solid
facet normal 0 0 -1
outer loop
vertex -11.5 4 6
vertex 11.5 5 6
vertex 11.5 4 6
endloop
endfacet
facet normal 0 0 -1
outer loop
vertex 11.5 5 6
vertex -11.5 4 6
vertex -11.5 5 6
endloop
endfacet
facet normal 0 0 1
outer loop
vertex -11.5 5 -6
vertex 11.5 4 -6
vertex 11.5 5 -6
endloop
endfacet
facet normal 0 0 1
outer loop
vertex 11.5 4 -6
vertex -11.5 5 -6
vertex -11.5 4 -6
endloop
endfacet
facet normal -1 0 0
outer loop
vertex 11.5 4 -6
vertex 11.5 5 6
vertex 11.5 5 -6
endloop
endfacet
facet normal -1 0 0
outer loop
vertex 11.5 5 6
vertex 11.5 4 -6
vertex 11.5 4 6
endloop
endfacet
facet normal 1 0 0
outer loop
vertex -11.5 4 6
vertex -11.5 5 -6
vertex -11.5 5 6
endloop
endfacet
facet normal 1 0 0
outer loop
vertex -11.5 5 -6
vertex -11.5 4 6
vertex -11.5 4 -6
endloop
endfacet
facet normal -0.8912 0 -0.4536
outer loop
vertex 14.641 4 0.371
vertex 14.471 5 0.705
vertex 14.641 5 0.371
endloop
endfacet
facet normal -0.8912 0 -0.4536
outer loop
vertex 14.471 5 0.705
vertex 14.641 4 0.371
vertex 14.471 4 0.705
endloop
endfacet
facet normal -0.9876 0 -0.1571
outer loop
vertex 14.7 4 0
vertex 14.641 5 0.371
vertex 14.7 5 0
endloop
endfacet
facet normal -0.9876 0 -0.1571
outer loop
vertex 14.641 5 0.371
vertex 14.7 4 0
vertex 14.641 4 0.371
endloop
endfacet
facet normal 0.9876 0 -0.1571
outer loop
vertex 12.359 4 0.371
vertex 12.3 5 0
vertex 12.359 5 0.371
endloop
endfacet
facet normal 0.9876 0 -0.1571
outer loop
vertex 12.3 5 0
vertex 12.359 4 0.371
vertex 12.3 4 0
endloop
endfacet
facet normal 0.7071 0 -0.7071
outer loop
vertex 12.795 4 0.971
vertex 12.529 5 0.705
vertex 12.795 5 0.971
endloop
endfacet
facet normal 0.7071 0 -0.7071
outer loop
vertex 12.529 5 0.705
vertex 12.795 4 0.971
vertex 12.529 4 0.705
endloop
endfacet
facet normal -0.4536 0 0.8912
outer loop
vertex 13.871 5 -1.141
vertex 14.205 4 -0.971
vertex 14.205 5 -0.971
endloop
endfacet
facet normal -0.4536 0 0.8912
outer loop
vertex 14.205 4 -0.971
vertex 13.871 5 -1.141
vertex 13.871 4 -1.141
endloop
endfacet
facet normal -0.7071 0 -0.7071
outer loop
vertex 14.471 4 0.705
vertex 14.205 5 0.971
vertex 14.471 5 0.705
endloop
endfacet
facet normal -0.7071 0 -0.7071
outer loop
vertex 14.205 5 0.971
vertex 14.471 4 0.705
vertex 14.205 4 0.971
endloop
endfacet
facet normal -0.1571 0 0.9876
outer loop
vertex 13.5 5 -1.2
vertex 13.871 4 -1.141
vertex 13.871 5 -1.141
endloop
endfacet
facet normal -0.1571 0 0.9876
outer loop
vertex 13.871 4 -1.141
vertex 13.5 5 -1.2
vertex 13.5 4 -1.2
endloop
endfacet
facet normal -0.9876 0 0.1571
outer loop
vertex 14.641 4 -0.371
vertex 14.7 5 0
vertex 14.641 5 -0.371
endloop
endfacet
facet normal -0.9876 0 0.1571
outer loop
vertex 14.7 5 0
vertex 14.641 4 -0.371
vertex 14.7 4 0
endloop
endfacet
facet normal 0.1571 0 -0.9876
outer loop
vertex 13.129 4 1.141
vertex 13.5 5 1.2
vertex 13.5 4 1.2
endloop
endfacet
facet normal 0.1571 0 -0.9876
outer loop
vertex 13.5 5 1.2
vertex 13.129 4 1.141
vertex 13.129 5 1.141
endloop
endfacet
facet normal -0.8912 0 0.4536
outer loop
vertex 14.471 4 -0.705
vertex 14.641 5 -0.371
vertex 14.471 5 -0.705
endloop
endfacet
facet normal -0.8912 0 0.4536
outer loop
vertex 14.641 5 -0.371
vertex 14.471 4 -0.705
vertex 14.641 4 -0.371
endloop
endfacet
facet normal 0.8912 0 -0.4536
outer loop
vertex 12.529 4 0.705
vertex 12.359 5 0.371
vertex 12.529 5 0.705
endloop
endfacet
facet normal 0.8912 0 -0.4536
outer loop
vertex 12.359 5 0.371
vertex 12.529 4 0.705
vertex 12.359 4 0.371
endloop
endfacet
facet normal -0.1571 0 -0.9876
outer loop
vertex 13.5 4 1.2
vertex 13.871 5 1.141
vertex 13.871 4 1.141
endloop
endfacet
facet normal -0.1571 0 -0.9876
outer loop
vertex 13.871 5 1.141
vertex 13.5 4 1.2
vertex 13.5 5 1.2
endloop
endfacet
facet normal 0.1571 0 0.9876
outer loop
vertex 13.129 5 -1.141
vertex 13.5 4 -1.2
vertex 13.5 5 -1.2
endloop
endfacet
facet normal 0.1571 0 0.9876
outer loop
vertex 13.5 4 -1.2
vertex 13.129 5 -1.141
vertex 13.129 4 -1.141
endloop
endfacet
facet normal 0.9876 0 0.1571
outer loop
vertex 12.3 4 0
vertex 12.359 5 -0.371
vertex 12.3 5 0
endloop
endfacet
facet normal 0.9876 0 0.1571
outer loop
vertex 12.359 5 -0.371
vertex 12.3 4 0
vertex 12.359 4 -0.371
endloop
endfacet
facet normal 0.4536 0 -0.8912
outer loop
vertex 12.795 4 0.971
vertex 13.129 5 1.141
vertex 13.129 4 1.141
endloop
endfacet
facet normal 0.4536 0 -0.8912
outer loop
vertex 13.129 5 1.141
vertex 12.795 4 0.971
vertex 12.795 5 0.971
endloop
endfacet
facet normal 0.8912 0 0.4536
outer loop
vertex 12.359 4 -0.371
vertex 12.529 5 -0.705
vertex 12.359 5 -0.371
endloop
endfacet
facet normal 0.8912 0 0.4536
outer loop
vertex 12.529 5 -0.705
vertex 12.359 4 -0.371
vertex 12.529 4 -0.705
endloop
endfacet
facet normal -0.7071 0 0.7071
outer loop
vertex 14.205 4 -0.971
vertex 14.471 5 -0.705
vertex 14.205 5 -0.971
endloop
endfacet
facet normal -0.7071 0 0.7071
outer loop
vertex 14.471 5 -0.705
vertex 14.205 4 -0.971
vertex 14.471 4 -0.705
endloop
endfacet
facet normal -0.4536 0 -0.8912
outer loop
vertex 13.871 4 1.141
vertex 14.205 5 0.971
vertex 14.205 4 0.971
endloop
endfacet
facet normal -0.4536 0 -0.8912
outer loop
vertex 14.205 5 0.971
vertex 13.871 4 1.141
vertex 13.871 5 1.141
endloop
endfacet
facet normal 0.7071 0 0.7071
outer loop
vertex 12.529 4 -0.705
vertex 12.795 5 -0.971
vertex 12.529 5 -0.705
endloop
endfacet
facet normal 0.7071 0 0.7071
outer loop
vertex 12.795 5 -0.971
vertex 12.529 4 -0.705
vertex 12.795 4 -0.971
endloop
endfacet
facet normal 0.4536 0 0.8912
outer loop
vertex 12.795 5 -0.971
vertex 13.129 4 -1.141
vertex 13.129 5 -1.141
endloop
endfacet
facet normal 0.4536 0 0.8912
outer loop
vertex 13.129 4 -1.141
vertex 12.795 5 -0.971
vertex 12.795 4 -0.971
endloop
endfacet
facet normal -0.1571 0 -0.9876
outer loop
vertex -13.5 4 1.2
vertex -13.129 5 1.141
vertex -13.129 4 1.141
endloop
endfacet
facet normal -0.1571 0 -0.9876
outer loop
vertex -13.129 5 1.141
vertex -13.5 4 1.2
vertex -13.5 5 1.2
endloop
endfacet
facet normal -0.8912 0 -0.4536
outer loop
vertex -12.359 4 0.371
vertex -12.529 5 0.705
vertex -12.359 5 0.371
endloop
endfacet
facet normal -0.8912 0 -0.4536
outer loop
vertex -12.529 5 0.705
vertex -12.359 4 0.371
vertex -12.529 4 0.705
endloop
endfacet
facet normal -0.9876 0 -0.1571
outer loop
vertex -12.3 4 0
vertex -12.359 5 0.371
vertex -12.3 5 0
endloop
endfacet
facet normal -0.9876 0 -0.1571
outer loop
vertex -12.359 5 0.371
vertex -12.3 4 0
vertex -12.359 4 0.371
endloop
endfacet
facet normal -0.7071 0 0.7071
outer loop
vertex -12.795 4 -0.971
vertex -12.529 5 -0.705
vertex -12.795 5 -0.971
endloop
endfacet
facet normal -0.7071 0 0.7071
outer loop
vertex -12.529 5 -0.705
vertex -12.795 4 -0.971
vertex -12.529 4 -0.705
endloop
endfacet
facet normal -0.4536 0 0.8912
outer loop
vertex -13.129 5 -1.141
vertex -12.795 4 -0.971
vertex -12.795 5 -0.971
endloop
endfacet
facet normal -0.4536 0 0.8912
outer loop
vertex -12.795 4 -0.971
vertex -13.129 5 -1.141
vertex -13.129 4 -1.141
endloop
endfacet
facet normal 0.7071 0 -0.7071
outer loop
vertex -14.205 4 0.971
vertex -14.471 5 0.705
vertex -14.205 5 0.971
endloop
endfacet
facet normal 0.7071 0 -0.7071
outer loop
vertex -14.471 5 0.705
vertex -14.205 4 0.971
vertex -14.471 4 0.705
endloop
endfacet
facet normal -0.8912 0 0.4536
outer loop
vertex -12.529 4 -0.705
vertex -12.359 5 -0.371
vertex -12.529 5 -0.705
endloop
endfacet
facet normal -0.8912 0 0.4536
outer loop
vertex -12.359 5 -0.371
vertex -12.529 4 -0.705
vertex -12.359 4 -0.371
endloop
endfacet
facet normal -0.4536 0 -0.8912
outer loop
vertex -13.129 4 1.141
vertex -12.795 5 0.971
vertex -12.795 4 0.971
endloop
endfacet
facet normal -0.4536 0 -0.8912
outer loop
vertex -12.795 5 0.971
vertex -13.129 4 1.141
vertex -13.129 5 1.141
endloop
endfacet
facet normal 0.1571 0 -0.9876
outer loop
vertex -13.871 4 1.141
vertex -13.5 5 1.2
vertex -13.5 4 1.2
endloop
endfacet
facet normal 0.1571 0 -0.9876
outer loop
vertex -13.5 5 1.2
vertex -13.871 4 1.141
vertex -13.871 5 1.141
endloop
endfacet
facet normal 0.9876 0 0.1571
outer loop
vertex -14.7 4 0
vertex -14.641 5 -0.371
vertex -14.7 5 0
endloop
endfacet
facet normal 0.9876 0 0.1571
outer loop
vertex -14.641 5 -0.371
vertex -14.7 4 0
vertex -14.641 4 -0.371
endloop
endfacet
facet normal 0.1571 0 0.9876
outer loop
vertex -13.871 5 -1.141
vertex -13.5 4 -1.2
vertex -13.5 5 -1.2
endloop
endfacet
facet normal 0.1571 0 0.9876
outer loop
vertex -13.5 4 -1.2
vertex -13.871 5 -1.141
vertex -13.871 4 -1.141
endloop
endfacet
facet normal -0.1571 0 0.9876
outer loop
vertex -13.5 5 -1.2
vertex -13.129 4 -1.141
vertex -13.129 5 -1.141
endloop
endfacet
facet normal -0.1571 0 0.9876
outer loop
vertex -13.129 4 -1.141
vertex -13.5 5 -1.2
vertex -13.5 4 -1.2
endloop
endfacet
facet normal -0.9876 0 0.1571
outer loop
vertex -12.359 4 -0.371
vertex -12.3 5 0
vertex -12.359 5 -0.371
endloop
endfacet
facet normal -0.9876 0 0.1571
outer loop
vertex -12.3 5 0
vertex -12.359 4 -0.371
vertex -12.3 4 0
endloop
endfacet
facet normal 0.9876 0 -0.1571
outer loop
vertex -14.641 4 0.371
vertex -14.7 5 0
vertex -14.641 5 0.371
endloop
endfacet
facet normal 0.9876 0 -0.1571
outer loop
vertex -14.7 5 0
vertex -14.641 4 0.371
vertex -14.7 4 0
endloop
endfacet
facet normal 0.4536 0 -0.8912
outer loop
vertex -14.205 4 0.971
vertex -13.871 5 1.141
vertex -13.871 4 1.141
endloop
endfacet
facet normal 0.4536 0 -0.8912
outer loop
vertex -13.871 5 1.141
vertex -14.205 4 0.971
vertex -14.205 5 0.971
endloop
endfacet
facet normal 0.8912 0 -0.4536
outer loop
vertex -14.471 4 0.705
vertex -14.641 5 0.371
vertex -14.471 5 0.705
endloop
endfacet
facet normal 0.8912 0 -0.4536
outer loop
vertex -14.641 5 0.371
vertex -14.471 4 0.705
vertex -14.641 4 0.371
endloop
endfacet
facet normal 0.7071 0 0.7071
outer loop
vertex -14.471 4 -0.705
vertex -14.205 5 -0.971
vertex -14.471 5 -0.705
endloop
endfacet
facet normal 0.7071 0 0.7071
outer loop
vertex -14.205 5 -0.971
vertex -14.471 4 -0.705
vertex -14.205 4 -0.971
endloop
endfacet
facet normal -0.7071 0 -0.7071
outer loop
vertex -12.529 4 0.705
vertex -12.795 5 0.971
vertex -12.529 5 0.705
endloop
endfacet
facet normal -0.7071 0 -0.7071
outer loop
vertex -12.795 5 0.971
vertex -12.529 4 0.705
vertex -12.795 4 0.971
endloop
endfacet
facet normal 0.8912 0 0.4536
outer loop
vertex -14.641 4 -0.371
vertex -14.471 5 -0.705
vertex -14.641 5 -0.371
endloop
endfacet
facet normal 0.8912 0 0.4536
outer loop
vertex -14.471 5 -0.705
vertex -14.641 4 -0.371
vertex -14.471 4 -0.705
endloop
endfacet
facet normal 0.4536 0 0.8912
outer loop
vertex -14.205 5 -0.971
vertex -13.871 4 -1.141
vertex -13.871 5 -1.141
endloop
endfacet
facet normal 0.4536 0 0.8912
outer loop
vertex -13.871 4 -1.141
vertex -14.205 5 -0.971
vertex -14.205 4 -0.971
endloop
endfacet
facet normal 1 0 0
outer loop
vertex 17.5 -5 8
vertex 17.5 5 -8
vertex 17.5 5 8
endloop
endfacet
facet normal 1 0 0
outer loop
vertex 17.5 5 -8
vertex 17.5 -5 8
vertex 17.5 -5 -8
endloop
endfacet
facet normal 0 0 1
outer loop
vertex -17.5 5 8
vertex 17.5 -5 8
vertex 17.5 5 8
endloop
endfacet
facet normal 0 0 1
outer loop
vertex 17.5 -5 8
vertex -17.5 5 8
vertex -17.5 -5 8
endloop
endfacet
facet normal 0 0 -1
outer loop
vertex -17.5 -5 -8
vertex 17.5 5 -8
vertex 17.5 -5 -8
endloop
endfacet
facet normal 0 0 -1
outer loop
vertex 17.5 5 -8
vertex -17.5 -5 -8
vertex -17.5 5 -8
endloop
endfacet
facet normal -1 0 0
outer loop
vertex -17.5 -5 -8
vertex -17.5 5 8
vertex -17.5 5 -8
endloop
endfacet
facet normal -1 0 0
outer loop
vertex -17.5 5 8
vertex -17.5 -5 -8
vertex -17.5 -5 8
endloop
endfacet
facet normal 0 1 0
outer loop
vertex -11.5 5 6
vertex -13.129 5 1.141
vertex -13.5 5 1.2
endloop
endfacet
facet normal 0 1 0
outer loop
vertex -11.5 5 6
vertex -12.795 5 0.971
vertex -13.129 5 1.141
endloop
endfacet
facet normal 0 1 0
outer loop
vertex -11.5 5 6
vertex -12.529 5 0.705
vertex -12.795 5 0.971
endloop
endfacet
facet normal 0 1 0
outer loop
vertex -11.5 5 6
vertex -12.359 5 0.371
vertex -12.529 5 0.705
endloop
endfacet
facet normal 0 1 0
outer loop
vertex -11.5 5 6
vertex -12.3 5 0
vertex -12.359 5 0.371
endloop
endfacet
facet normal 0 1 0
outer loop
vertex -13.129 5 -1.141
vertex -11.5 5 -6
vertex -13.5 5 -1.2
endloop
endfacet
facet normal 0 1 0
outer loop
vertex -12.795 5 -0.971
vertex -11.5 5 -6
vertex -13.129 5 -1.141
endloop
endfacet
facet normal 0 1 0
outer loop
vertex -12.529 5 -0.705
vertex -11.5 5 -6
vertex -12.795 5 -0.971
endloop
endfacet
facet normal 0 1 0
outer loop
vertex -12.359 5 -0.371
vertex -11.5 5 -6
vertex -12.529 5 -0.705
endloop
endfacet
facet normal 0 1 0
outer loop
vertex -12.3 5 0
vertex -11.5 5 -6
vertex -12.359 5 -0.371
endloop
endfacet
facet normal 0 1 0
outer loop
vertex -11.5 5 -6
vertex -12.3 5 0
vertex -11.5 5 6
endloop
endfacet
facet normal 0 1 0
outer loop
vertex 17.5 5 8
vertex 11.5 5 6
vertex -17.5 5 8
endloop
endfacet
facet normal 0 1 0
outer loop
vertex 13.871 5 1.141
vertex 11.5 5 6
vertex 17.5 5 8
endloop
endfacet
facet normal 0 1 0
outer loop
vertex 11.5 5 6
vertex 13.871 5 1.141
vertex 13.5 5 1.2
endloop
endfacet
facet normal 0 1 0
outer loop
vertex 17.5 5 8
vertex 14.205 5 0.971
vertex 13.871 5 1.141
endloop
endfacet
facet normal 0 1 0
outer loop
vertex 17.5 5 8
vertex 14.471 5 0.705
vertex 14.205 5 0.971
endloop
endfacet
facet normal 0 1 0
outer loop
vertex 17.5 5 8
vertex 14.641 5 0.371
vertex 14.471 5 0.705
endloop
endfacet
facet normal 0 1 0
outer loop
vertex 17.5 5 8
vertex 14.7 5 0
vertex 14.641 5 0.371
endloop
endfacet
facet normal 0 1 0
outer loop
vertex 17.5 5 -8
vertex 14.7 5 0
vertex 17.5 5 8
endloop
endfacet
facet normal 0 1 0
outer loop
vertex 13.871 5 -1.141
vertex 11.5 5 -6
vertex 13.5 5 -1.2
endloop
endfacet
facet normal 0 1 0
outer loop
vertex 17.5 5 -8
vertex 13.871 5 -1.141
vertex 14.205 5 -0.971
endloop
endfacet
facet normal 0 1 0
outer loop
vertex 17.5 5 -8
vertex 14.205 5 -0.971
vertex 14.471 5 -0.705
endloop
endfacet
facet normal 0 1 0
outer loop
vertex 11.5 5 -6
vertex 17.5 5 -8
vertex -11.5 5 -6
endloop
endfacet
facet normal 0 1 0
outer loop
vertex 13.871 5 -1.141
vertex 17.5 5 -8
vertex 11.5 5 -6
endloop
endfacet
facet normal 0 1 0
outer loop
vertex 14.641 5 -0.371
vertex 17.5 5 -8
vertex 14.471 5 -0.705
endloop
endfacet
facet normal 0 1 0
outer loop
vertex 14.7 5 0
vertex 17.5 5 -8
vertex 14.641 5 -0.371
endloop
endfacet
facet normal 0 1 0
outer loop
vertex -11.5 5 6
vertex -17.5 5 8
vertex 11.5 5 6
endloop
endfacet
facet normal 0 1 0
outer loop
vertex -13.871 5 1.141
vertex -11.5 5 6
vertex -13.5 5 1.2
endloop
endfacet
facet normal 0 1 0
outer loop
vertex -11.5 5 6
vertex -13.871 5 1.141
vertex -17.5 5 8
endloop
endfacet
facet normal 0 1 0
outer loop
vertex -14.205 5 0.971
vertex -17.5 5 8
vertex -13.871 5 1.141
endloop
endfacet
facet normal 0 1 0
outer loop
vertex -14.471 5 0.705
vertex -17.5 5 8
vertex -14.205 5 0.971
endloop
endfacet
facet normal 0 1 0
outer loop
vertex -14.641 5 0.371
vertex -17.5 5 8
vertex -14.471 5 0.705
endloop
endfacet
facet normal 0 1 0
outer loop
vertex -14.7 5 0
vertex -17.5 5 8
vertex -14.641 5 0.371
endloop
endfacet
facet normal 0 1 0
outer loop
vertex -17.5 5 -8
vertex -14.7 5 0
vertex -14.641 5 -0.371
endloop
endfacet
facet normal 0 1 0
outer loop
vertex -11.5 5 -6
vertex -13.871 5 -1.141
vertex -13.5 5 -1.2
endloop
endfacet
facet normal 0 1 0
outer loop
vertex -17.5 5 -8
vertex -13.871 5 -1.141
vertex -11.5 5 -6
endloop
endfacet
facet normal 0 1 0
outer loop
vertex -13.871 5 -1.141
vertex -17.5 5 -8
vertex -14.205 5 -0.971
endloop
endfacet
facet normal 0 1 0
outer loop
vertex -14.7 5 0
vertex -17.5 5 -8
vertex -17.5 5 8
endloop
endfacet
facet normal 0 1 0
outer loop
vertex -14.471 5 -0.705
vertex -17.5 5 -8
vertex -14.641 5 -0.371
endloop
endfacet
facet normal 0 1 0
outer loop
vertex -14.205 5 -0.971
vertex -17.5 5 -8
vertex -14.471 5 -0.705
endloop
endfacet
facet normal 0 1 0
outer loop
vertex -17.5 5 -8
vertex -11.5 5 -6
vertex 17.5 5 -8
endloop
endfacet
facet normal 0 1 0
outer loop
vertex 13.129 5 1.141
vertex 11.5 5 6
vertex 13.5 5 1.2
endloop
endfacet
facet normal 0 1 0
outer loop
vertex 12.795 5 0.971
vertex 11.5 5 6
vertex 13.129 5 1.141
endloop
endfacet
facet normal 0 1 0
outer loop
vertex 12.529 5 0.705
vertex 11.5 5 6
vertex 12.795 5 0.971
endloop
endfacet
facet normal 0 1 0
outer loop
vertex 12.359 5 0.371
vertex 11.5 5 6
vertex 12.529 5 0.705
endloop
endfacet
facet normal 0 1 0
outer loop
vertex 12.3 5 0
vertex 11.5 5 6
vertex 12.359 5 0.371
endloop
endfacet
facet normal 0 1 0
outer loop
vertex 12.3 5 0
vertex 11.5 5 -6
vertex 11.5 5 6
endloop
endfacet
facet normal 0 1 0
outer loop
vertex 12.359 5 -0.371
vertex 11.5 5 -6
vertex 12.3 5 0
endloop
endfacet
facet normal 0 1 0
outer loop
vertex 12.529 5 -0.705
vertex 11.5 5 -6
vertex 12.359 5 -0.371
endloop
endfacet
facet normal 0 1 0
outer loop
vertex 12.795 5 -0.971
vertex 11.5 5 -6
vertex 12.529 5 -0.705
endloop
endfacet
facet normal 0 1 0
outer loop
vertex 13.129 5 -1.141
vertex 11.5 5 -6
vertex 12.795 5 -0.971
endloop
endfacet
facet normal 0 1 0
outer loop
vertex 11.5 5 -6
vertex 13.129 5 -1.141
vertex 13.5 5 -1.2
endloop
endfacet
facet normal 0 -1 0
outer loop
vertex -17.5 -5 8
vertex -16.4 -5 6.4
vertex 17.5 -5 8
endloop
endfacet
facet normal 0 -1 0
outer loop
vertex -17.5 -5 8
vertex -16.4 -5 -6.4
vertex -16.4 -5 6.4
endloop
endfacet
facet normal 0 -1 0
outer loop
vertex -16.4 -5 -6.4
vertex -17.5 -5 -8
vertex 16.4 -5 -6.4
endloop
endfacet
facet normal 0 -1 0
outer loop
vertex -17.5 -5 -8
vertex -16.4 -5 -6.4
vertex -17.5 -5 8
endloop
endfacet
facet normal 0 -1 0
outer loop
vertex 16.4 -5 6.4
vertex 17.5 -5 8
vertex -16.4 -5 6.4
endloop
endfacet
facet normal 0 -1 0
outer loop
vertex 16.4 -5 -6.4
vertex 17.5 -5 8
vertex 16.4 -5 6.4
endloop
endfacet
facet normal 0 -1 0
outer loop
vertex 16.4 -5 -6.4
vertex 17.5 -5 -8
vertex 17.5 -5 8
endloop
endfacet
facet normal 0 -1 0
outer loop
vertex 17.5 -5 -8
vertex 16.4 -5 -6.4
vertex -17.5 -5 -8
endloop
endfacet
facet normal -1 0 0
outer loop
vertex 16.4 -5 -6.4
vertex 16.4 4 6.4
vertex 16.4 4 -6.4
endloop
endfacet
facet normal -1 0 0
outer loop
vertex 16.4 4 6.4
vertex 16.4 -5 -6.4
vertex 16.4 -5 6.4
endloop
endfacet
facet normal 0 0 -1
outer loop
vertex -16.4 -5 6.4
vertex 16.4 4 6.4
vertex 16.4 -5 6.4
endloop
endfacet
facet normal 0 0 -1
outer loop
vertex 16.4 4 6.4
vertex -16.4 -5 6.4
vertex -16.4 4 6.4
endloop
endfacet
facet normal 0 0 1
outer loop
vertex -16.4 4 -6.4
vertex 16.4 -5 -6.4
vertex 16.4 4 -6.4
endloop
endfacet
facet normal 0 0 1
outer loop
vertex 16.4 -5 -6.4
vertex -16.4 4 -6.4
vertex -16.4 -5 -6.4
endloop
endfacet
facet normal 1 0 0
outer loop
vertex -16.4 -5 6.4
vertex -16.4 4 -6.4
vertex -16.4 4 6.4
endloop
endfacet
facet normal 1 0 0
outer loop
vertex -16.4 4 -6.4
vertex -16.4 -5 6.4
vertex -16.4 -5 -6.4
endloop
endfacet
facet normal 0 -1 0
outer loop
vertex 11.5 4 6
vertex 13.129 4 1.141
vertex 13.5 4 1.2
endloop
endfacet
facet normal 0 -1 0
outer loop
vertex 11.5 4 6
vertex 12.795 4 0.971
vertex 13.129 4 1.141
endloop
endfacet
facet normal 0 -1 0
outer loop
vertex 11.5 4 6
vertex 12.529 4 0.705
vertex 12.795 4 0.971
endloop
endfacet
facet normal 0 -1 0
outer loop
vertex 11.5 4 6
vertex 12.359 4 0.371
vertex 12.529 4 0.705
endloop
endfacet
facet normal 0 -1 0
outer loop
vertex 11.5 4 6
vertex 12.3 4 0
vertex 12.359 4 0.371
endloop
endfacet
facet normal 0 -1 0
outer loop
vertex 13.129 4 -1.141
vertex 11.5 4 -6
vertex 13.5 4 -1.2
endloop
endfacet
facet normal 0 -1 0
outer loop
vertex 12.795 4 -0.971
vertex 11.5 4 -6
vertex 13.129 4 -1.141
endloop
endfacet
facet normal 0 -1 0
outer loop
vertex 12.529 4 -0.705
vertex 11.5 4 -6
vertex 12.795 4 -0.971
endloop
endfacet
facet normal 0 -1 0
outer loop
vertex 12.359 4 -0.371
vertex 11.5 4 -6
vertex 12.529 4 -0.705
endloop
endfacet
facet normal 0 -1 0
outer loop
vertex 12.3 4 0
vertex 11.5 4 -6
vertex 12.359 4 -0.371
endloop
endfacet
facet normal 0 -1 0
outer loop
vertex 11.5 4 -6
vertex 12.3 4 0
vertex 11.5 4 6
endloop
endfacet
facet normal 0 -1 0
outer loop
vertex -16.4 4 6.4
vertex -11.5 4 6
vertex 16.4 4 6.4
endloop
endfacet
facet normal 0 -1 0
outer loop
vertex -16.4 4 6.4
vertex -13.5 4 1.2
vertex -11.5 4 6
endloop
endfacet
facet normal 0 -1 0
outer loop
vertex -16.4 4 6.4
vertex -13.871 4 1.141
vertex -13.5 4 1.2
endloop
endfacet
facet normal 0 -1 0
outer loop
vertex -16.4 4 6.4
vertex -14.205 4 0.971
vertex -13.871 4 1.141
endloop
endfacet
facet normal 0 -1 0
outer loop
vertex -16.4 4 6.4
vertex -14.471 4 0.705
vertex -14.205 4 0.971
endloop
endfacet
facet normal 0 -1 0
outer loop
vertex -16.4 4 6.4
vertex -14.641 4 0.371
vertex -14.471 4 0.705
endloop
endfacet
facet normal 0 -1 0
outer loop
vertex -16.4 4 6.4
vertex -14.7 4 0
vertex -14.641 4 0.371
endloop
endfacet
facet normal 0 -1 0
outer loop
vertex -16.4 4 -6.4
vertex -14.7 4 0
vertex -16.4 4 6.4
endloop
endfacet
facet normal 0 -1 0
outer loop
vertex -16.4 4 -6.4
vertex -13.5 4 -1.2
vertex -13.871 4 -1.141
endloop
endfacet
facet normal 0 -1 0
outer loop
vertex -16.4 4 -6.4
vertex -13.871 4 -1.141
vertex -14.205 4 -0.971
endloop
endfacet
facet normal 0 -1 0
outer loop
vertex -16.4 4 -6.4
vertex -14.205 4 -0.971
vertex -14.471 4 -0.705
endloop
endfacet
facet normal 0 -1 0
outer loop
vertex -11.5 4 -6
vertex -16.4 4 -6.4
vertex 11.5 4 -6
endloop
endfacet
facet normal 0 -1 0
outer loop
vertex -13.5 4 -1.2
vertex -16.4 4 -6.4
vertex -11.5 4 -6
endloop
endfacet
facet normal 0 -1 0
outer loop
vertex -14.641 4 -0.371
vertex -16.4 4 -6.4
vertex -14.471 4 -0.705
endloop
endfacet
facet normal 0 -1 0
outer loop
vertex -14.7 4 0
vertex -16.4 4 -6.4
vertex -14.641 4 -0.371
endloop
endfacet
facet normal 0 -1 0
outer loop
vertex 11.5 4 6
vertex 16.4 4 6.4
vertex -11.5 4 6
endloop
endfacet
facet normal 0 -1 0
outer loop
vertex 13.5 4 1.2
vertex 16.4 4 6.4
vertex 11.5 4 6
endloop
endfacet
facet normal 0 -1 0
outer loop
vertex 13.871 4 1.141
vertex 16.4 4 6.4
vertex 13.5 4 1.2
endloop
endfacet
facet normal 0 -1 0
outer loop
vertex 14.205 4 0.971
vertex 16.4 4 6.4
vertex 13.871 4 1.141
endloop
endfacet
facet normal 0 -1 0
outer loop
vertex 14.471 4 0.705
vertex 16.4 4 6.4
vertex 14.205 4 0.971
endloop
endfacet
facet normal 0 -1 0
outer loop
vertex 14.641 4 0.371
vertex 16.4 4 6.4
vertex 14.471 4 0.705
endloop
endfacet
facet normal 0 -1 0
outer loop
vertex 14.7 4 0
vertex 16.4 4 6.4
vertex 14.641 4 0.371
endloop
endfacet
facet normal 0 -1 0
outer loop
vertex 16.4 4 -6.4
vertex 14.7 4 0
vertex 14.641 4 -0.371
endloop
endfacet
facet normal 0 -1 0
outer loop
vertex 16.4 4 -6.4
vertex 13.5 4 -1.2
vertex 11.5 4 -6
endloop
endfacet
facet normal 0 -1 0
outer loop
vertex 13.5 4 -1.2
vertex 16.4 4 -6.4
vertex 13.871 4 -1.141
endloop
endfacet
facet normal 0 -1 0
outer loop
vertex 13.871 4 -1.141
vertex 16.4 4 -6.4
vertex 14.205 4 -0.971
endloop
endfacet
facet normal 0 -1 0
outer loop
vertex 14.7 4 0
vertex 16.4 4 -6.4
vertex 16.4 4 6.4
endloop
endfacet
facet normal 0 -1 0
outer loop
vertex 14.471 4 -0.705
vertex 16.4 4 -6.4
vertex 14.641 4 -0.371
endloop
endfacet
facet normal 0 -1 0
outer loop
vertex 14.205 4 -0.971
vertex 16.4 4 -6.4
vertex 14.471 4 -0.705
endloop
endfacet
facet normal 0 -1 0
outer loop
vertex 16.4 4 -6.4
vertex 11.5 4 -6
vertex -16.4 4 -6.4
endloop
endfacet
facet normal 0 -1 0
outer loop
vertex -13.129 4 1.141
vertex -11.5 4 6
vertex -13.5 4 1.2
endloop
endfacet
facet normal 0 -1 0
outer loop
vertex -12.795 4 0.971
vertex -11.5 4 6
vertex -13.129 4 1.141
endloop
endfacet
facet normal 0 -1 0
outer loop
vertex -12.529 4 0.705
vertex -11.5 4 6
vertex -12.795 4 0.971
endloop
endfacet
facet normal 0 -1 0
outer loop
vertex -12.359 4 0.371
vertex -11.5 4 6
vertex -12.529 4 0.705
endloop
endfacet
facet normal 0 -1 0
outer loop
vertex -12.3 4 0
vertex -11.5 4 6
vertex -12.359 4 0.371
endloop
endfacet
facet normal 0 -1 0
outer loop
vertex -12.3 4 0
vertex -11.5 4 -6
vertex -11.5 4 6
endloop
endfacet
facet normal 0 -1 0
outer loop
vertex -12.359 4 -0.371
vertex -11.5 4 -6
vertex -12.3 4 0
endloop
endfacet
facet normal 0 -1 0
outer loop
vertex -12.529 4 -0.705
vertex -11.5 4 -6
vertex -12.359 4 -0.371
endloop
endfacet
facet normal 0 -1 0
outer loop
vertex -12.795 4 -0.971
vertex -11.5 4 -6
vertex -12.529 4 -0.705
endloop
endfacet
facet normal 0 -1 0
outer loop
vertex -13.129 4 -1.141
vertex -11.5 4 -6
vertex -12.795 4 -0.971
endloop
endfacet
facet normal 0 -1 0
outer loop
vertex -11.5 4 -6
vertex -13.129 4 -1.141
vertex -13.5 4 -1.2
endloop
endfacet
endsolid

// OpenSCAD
module mg_90(){
	scale([32,3,12])
	cube(1,center=true);


	translate([0,6.5,0])
	scale([23,25,12])
	cube(1,center=true);


	translate([5,0,0])
	rotate([90,0,0])
	cylinder(r=6,h=8,center=false);


	translate([5,0,0])
	rotate([90,0,0])
	cylinder(r=2.5,h=12,center=false);



	translate([13.5,0,0])
	rotate([90,0,0])
	cylinder(r=1.2,h=15,center=true,$fn=20);


	translate([-13.5,0,0])
	rotate([90,0,0])
	cylinder(r=1.2,h=15,center=true,$fn=20);
}


cl=0.8;

// hull()
difference(){

cube(size=[35,10,16], center=true);
translate([0,-2,0])
cube(size=[32+cl,12,12+cl], center=true);

mg_90();
}
